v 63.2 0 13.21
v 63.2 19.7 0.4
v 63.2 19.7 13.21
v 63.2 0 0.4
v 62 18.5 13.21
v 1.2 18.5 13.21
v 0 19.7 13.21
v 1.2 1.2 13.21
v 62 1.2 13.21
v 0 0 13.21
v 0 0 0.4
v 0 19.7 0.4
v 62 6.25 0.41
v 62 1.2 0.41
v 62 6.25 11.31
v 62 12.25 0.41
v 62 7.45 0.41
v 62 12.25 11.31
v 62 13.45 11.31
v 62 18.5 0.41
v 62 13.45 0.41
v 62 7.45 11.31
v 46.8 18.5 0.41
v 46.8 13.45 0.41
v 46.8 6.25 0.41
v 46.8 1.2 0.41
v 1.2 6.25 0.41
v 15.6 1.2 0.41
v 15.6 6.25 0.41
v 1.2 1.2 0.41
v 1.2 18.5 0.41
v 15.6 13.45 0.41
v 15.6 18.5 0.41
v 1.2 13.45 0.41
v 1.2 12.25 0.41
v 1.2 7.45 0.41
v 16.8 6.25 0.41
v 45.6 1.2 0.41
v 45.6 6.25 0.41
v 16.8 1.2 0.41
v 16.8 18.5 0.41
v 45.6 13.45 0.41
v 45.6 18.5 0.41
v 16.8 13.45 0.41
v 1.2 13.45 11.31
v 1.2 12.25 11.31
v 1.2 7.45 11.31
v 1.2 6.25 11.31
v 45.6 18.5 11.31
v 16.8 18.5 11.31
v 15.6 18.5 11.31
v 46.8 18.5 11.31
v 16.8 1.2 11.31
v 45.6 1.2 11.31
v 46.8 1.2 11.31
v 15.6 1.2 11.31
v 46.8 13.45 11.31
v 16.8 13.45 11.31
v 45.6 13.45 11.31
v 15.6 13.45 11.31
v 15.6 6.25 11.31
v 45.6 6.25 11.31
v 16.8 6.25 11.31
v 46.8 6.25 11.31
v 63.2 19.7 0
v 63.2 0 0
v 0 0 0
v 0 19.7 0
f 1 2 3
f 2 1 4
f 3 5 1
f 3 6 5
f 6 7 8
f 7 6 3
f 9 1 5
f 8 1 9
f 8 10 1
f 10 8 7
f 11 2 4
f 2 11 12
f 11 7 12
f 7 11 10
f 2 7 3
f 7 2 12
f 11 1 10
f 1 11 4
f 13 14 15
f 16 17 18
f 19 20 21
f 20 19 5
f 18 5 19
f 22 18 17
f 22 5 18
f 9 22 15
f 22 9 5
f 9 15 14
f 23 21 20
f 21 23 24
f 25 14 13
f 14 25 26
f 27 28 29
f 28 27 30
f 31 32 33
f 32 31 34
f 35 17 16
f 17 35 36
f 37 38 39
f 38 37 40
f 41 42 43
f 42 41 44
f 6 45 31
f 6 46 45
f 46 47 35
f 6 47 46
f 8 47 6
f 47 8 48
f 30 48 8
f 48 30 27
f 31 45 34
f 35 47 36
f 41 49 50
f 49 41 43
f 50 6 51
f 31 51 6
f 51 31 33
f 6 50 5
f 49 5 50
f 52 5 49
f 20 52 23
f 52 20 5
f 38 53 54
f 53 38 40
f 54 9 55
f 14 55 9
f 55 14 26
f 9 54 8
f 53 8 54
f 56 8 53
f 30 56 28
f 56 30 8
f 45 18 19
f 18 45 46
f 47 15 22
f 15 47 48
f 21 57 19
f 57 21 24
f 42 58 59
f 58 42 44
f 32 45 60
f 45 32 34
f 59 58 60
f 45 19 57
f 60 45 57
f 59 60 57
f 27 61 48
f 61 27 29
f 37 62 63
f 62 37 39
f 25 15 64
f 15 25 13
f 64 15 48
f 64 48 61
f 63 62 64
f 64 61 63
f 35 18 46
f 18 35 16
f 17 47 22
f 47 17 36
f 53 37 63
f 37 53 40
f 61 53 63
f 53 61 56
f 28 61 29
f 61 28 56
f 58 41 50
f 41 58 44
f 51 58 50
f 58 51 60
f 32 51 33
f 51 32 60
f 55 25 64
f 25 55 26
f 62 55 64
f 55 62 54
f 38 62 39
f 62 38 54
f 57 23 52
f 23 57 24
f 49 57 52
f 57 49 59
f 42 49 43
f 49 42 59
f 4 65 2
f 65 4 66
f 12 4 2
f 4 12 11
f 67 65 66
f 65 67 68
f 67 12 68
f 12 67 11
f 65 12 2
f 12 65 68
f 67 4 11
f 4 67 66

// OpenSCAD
// file: ../../Base/Boxes.scad
// Fischertechnik Box Foundation
// Pre-designed Boxes

use <Constants.scad>

include <PlacementOptions.scad>

box190Width = 190;
box190Depth = 130;
box130Width = 130;
box130Depth = 95;
boxUsageHeight = 33.9;
boxWallThickness = 2.4;
boxBaseThickness = 1.0;
boxWebWidth = 3.0;

// getBoxWallThickness()
// Gets the wall thickness of a Fischertechnik Box

function getBoxWallThickness() = boxWallThickness;

// Gets the usable height of a fischertechnik box
function getBoxUsageHeight() = boxUsageHeight;

// Gets the thickness of the Fischertechnik box base.
function getBoxBaseThickness() = boxBaseThickness;

// Gets the width of a box web
function getBoxWebWidth() = boxWebWidth;

// Gets the usable inner space of a Box 190 as an x/y-list
function getBox190Space() = [
    box190Width - 2*getBoxWallThickness(), 
    box190Depth - 2*getBoxWallThickness() ];

// Imports the Fischertechnik empty box 130x190 mm and places it at position 0,0
// 190x130 are the outer sizes, the inner space is slightly smaller. Use getBox190Space() to get the inner sizes.
// This module needs the STL file "Fischertechnik Box 130x190.stl" in the library path.
// The box is positioned that the usable inner space is at the 0,0,0 position. The

module Box190() {
    translate([-getBoxWallThickness(),-getBoxWallThickness(),-getBoxBaseThickness()])
        import("Fischertechnik Box 130x190.stl", convexity=3);
}

// Gets the usable inner space of a Box 130 as an x/y-list
function getBox130Space() = [
    box130Width - 2*getBoxWallThickness(), 
    box130Depth - 2*getBoxWallThickness() ];

// Imports the Fischertechnik empty box 95x130 mm and places it at position 0,0
// 190x130 are the outer sizes, the inner space is slightly smaller. Use getBox190Space() to get the inner sizes.
// This module needs the STL file "Fischertechnik Box 95x130.stl" in the library path.
// The box is positioned that the usable inner space is at the 0,0,0 position. The

module Box130() {
    translate([-getBoxWallThickness(),-getBoxWallThickness(),-getBoxBaseThickness()])
        import("Fischertechnik Box 95x130.stl", convexity=3);
}

// Creates a web at the specified box walls
// corner 0 = LowerLeft, 1 = UpperLeft, 2 = UpperRight, 3 = LowerRight
// side 0 = LeftOfCorner, 1 = RightOfCorner
// distance = Distance in mm from the corner
// box = inner width and depth of the box (default: Box 190)
// webWidth = length of the web (default is 3 mms)
// webThickness = thickness of the web (default is 1 mm)

module BoxWeb(corner, side, distance, box=getBox190Space(), webWidth=getBoxWebWidth(), webThickness=1.0) {
    sink = getBoxWallThickness()/2;

    width = (corner % 2 == 0) ? 
            (side == LeftOfCorner ? webWidth : webThickness) :
            (side == LeftOfCorner ? webThickness : webWidth);

    depth = (corner % 2 == 0) ? 
            (side == RightOfCorner ? webWidth : webThickness) :
            (side == RightOfCorner ? webThickness : webWidth);
    
    xDiff = corner == LowerLeft ? 
                (side == LeftOfCorner ? -sink : distance) :
            (corner == UpperLeft ?                
                (side == LeftOfCorner ? distance : -sink) :
            (corner == UpperRight ?
                (side == LeftOfCorner ? box.x-webWidth+sink : box.x-distance-webThickness) :
                (side == LeftOfCorner ? box.x-distance-webThickness: box.x-webWidth+sink)));

    yDiff = corner == LowerLeft ? 
                (side == RightOfCorner ? -sink : distance) :
            (corner == UpperLeft ?
                (side == RightOfCorner ? box.y-distance : box.y-webWidth+sink) :
            (corner == UpperRight ?
                (side == RightOfCorner ? box.y-webWidth+sink : box.y-distance) :
                (side == RightOfCorner ? distance : -sink)));
    
    translate([xDiff, yDiff, -getExcess()])
        cube([width, depth, boxUsageHeight + 2*getExcess()]);
}
// file: ../../Base/Rotation.scad
// Fischertechnik Box Foundation
// Geometry Helpers Rotation

include <PlacementOptions.scad>

// getRotatedSpace(space, rotation=NoRotation)
// Rotates the space dependent on the specified rotation

function getRotatedSpace(space, rotation=NoRotation) = [
    (rotation == Rotate90 || rotation == Rotate270) ? space.y : space.x,
    (rotation == Rotate90 || rotation == Rotate270) ? space.x : space.y
];

// Rotates the given space around the fixed left lower corner
// space = the space the children needs as width/depth list [width,depth]
// rotation = 0 Rotate0 degrees, 1 Rotate90 degrees, 2 Rotate180 degrees, 3 Rotate270 degrees (equivalent to -90)

module RotateFix(space, rotation=Rotate0) {
    dy = (rotation == Rotate0 || rotation == Rotate270) ? 0 :
        (rotation == Rotate90) ? space.x :
        space.y;
    dx = (rotation < Rotate180) ? 0 :
        (rotation == Rotate180) ? space.x :
        space.y;
    
    translate([dx, dy, 0])
        rotate([0, 0, rotations[rotation]])
            children();
}
// file: ../../Base/Alignment.scad
// Fischertechnik Box Foundation
// Geometry Helpers Alignment

include <PlacementOptions.scad>

// getAlignedX(elementWidth, spaceWidth, align=AlignRight, offset=0)
// Gets the aligned X offset of an element with the given
// width in the given space.
// elementWidth = The width of the element to positon
// spaceWidth = The space where the element should be aligned
// align = 0 AlignLeft, 1 AlignCenter, 2 AlignRight
// offset = an optional offset from the aligned position. When
// aligned left or centered, then positive values are in X direction.
// When aligned right then positive values are in negative X direction.

function getAlignedX(elementWidth, spaceWidth, align=AlignRight, offset=0) =
    (align == AlignLeft) ?
        offset :
        ((align == AlignCenter) ?
        (spaceWidth - elementWidth)/2 + offset :
        spaceWidth - offset - elementWidth);

// getAlignedY(elementDepth, spaceDepth, align=AlignTop, offset=0)
// Gets the aligned Y offset of an element with the given
// depth in the given space.
// elementDepth = The depth of the element to positon
// spaceDepth = The space where the element should be aligned
// align = 0 AlignBottom, 1 AlignCenter, 2 AlignTop
// offset = an optional offset from the aligned position. When
// aligned bottom or centered, then positive values are in Y direction.
// When aligned top then positive values are in negative Y direction.

function getAlignedY(elementDepth, spaceDepth, align=AlignTop, offset=0) =
    (align == AlignBottom) ?
        offset :
        ((align == AlignCenter) ?
        (spaceDepth - elementDepth)/2 + offset :
        spaceDepth - offset - elementDepth);
// file: ../../Base/PlacementOptions.scad
// Fischertechnik Box Foundation
// Placement Options

// Alignment
NoAlign = 0;
AlignLeft = 1;
AlignBottom = 2;
AlignCenter = 3;
AlignRight = 4;
AlignTop = 5;

// Element rotation degree steps
rotations = [0, -90, -180, -270];

// Rotation
NoRotation = 0;
Rotate0 = 0;
Rotate90 = 1;
Rotate180 = 2;
Rotate270 = 3;

// Docking (seen from above)
NoDock = -1;
DockLeft = 0;
DockTop = 1;
DockRight = 2;
DockCorner = 2;
DockBottom = 3;

// Web corners
LowerLeft = 0;
UpperLeft = 1;
UpperRight = 2;
LowerRight = 3;

// Web position relative to corner
LeftOfCorner = 0;
RightOfCorner = 1;
// file: ../../Base/Placement.scad
// Fischertechnik Box Foundation
// Geometry Helpers Placement

use <Constants.scad>
use <Alignment.scad>
use <Rotation.scad>
use <Boxes.scad>

include <PlacementOptions.scad>

// Place(x=0, y=0, elementSpace=[0,0], alignX=AlignLeft, alignY=AlignBottom, rotation=Rotate0, boxSpace=getBox190Space())
// Places the child at the specified position
// y = Y-Position. This is a relative position when an X aligment is specified.
// x = X-Position. This is a relative position when an Y aligment is specified.
// elementSpace = space of the element to be placed [x,y]
// alignX = -1=NoAlign, 0 AlignLeft, 1 AlignCenter, 3 AlignRight (elementSpace and boxSpace required!)
// alignY = -1=NoAlign, 2 AlignBottom, 1 AlignCenter, 4 AlignTop (elementSpace and boxSpace required!)
// rotation = 0 Rotate0 0 degrees, 1 Rotate90 90 degrees, 
// 2 Rotate180 180 degrees, 3 Rotate270 270 degrees (equivalent to -90)
// boxSpace = Inner space of the box where the placement occurs [x,y] - default is Box 190x130 inner space

module Place(x=0, y=0, elementSpace=[0,0], 
  alignX=AlignLeft, alignY=AlignBottom, 
  rotation=NoRotation, boxSpace=getBox190Space()) {

    module Position(x, y, space, rotation=Rotate0) {
        translate([x, y, 0])
            RotateFix(space, rotation)
                children();
    }

    space = getRotatedSpace(elementSpace, rotation);
    alignedX = getAlignedX(space.x, boxSpace.x, alignX, x);
    alignedY = getAlignedY(space.y, boxSpace.y, alignY, y);
    Position(alignedX, alignedY, elementSpace, rotation)
        children();
}

// Center(space=getBox130Space(), elementSpace=[0,0])
// space = Space where the children is centered. For cylinder use centered=true and no elementSpace.
// elementSpace = space of the element to be centered [x,y]

module Center(space=getBox190Space(), elementSpace=[0,0]) {
    translate([(space.x - elementSpace.x) / 2, (space.y - elementSpace.y) / 2])
        children(0);
}

// CenterHorizontal(width=0, y=0, offset=0, space=getBox130Space())
// space = Space where the children is centered. For cylinder use centered=true and no elementSpace.
// elementSpace = space of the element to be centered [x,y]

module CenterHorizontal(width=0, y=0, offset=0, space=getBox190Space()) {
    translate([(space.x - width) / 2 + offset, y])
        children(0);
}

// CenterVertical(depth=0, x=0, offset=0, space=getBox130Space())
// space = Space where the children is centered. For cylinder use centered=true and no elementSpace.
// elementSpace = space of the element to be centered [x,y]

module CenterVertical(depth=0, x=0, offset=0, space=getBox190Space()) {
    translate([x, (space.y - depth) / 2 + offset])
        children(0);
}
// file: ../../Elements/AxisClip10.scad
// Fischertechnik Box Library
// Axis for clip 10
// 31023

use <../ModelBase/Simple.scad>

width = 12;
depth = 12;
height = 23;

// getAxisClip10Space()
// Gets the space of a frame for a clip 10 with spring ring (mot2)

function getAxisClip10Space() = [width, depth, height];

// AxisClip10()
// Axis for clip 10 with spring ring (mot2)

module AxisClip10() {
    LeveledAxisWithSpace(height, height-10, getAxisClip10Space());
}

// Tests
color("lightgray")
AxisClip10();
// file: ../../Base/Constants.scad
// Fischertechnik Box Foundation
// Constants

// Constant values necessary for multiple elements

// Base constants
dividerThickness = 1.2;
excess = 0.01;
fragments = 90;
tolerance = 0.8;

// Gets the thickness of a divider 
function getDividerThickness() = dividerThickness;

// Gets the excess that is used to merge walls into each other
function getExcess() = excess;

// Gets amount of fragments of a cylinder
function getFragments() = fragments;

// Gets the inner tolerance of a frame to each side
function getTolerance() = tolerance;


// Fischertechnik specific constants
axisDiameter = 4;
axisBottomDiameter = axisDiameter + 1;
standardEdgeDistance = 2.5;
standardWebDistance = 11.5;
standardCornerLength = 15;
tubeWallFactor = 0.8;

// Gets axis diameter
function getAxisDiameter() = axisDiameter;

// Gets axis bottom diameter for thicker part at the bottom
function getAxisBottomDiameter() = axisBottomDiameter;

// gets the standard distance to the wall of the box for dockable frames with webs
function getStandardEdgeDistance() = standardEdgeDistance;

// gets the standard distance of each web to the corner of the dockable frame
function getStandardWebDistance() = standardWebDistance;

// gets the standard length of the corner walls of a dockable frame
function getStandardCornerLength() = standardCornerLength;

// gets the wall thickness of a tube.
function getTubeWallThickness() = tubeWallFactor * getDividerThickness();
// file: ../../Elements/FrameRack60.scad
// Fischertechnik Box Library
// Frame for Rack 60
// 31053

use <../ModelBase/Complex.scad>

width = 30;
depth = 15;
height = 12.8;
factor = 2;

// getFrameRack60Space(count=1)
// Gets the space for a frame for count racks 60 in one row.

function getFrameRack60Space(count=1) = getFrameRackSpace(factor, count);

// FrameRack(count)
// Frame for rack 60. The racks 30 are ordered in line.
// A frame for two racks 30 is identical to a single frame for a rack 60.
// count = Count of racks

module FrameRack60(count=1) {
    FrameRack(factor, count);
}

// Test
color("lightgray")
FrameRack60(1);
// file: ../TestPrint.scad
// 3D Print Test Base

use <../Base/Constants.scad>

use <../Elements/AxisClip10.scad>

module TestPrint(elementSpace) {
    cube([elementSpace.x, elementSpace.y, 0.4]);
    translate([0,0,0.4+getExcess()]) {
        children();
    }
}

TestPrint(getAxisClip10Space())
    AxisClip10();
// main file
// 3D Print Test Base
// FrameRack60

use <../TestPrint.scad>
use <../../Elements/FrameRack60.scad>

TestPrint(getFrameRack60Space())
    FrameRack60();
